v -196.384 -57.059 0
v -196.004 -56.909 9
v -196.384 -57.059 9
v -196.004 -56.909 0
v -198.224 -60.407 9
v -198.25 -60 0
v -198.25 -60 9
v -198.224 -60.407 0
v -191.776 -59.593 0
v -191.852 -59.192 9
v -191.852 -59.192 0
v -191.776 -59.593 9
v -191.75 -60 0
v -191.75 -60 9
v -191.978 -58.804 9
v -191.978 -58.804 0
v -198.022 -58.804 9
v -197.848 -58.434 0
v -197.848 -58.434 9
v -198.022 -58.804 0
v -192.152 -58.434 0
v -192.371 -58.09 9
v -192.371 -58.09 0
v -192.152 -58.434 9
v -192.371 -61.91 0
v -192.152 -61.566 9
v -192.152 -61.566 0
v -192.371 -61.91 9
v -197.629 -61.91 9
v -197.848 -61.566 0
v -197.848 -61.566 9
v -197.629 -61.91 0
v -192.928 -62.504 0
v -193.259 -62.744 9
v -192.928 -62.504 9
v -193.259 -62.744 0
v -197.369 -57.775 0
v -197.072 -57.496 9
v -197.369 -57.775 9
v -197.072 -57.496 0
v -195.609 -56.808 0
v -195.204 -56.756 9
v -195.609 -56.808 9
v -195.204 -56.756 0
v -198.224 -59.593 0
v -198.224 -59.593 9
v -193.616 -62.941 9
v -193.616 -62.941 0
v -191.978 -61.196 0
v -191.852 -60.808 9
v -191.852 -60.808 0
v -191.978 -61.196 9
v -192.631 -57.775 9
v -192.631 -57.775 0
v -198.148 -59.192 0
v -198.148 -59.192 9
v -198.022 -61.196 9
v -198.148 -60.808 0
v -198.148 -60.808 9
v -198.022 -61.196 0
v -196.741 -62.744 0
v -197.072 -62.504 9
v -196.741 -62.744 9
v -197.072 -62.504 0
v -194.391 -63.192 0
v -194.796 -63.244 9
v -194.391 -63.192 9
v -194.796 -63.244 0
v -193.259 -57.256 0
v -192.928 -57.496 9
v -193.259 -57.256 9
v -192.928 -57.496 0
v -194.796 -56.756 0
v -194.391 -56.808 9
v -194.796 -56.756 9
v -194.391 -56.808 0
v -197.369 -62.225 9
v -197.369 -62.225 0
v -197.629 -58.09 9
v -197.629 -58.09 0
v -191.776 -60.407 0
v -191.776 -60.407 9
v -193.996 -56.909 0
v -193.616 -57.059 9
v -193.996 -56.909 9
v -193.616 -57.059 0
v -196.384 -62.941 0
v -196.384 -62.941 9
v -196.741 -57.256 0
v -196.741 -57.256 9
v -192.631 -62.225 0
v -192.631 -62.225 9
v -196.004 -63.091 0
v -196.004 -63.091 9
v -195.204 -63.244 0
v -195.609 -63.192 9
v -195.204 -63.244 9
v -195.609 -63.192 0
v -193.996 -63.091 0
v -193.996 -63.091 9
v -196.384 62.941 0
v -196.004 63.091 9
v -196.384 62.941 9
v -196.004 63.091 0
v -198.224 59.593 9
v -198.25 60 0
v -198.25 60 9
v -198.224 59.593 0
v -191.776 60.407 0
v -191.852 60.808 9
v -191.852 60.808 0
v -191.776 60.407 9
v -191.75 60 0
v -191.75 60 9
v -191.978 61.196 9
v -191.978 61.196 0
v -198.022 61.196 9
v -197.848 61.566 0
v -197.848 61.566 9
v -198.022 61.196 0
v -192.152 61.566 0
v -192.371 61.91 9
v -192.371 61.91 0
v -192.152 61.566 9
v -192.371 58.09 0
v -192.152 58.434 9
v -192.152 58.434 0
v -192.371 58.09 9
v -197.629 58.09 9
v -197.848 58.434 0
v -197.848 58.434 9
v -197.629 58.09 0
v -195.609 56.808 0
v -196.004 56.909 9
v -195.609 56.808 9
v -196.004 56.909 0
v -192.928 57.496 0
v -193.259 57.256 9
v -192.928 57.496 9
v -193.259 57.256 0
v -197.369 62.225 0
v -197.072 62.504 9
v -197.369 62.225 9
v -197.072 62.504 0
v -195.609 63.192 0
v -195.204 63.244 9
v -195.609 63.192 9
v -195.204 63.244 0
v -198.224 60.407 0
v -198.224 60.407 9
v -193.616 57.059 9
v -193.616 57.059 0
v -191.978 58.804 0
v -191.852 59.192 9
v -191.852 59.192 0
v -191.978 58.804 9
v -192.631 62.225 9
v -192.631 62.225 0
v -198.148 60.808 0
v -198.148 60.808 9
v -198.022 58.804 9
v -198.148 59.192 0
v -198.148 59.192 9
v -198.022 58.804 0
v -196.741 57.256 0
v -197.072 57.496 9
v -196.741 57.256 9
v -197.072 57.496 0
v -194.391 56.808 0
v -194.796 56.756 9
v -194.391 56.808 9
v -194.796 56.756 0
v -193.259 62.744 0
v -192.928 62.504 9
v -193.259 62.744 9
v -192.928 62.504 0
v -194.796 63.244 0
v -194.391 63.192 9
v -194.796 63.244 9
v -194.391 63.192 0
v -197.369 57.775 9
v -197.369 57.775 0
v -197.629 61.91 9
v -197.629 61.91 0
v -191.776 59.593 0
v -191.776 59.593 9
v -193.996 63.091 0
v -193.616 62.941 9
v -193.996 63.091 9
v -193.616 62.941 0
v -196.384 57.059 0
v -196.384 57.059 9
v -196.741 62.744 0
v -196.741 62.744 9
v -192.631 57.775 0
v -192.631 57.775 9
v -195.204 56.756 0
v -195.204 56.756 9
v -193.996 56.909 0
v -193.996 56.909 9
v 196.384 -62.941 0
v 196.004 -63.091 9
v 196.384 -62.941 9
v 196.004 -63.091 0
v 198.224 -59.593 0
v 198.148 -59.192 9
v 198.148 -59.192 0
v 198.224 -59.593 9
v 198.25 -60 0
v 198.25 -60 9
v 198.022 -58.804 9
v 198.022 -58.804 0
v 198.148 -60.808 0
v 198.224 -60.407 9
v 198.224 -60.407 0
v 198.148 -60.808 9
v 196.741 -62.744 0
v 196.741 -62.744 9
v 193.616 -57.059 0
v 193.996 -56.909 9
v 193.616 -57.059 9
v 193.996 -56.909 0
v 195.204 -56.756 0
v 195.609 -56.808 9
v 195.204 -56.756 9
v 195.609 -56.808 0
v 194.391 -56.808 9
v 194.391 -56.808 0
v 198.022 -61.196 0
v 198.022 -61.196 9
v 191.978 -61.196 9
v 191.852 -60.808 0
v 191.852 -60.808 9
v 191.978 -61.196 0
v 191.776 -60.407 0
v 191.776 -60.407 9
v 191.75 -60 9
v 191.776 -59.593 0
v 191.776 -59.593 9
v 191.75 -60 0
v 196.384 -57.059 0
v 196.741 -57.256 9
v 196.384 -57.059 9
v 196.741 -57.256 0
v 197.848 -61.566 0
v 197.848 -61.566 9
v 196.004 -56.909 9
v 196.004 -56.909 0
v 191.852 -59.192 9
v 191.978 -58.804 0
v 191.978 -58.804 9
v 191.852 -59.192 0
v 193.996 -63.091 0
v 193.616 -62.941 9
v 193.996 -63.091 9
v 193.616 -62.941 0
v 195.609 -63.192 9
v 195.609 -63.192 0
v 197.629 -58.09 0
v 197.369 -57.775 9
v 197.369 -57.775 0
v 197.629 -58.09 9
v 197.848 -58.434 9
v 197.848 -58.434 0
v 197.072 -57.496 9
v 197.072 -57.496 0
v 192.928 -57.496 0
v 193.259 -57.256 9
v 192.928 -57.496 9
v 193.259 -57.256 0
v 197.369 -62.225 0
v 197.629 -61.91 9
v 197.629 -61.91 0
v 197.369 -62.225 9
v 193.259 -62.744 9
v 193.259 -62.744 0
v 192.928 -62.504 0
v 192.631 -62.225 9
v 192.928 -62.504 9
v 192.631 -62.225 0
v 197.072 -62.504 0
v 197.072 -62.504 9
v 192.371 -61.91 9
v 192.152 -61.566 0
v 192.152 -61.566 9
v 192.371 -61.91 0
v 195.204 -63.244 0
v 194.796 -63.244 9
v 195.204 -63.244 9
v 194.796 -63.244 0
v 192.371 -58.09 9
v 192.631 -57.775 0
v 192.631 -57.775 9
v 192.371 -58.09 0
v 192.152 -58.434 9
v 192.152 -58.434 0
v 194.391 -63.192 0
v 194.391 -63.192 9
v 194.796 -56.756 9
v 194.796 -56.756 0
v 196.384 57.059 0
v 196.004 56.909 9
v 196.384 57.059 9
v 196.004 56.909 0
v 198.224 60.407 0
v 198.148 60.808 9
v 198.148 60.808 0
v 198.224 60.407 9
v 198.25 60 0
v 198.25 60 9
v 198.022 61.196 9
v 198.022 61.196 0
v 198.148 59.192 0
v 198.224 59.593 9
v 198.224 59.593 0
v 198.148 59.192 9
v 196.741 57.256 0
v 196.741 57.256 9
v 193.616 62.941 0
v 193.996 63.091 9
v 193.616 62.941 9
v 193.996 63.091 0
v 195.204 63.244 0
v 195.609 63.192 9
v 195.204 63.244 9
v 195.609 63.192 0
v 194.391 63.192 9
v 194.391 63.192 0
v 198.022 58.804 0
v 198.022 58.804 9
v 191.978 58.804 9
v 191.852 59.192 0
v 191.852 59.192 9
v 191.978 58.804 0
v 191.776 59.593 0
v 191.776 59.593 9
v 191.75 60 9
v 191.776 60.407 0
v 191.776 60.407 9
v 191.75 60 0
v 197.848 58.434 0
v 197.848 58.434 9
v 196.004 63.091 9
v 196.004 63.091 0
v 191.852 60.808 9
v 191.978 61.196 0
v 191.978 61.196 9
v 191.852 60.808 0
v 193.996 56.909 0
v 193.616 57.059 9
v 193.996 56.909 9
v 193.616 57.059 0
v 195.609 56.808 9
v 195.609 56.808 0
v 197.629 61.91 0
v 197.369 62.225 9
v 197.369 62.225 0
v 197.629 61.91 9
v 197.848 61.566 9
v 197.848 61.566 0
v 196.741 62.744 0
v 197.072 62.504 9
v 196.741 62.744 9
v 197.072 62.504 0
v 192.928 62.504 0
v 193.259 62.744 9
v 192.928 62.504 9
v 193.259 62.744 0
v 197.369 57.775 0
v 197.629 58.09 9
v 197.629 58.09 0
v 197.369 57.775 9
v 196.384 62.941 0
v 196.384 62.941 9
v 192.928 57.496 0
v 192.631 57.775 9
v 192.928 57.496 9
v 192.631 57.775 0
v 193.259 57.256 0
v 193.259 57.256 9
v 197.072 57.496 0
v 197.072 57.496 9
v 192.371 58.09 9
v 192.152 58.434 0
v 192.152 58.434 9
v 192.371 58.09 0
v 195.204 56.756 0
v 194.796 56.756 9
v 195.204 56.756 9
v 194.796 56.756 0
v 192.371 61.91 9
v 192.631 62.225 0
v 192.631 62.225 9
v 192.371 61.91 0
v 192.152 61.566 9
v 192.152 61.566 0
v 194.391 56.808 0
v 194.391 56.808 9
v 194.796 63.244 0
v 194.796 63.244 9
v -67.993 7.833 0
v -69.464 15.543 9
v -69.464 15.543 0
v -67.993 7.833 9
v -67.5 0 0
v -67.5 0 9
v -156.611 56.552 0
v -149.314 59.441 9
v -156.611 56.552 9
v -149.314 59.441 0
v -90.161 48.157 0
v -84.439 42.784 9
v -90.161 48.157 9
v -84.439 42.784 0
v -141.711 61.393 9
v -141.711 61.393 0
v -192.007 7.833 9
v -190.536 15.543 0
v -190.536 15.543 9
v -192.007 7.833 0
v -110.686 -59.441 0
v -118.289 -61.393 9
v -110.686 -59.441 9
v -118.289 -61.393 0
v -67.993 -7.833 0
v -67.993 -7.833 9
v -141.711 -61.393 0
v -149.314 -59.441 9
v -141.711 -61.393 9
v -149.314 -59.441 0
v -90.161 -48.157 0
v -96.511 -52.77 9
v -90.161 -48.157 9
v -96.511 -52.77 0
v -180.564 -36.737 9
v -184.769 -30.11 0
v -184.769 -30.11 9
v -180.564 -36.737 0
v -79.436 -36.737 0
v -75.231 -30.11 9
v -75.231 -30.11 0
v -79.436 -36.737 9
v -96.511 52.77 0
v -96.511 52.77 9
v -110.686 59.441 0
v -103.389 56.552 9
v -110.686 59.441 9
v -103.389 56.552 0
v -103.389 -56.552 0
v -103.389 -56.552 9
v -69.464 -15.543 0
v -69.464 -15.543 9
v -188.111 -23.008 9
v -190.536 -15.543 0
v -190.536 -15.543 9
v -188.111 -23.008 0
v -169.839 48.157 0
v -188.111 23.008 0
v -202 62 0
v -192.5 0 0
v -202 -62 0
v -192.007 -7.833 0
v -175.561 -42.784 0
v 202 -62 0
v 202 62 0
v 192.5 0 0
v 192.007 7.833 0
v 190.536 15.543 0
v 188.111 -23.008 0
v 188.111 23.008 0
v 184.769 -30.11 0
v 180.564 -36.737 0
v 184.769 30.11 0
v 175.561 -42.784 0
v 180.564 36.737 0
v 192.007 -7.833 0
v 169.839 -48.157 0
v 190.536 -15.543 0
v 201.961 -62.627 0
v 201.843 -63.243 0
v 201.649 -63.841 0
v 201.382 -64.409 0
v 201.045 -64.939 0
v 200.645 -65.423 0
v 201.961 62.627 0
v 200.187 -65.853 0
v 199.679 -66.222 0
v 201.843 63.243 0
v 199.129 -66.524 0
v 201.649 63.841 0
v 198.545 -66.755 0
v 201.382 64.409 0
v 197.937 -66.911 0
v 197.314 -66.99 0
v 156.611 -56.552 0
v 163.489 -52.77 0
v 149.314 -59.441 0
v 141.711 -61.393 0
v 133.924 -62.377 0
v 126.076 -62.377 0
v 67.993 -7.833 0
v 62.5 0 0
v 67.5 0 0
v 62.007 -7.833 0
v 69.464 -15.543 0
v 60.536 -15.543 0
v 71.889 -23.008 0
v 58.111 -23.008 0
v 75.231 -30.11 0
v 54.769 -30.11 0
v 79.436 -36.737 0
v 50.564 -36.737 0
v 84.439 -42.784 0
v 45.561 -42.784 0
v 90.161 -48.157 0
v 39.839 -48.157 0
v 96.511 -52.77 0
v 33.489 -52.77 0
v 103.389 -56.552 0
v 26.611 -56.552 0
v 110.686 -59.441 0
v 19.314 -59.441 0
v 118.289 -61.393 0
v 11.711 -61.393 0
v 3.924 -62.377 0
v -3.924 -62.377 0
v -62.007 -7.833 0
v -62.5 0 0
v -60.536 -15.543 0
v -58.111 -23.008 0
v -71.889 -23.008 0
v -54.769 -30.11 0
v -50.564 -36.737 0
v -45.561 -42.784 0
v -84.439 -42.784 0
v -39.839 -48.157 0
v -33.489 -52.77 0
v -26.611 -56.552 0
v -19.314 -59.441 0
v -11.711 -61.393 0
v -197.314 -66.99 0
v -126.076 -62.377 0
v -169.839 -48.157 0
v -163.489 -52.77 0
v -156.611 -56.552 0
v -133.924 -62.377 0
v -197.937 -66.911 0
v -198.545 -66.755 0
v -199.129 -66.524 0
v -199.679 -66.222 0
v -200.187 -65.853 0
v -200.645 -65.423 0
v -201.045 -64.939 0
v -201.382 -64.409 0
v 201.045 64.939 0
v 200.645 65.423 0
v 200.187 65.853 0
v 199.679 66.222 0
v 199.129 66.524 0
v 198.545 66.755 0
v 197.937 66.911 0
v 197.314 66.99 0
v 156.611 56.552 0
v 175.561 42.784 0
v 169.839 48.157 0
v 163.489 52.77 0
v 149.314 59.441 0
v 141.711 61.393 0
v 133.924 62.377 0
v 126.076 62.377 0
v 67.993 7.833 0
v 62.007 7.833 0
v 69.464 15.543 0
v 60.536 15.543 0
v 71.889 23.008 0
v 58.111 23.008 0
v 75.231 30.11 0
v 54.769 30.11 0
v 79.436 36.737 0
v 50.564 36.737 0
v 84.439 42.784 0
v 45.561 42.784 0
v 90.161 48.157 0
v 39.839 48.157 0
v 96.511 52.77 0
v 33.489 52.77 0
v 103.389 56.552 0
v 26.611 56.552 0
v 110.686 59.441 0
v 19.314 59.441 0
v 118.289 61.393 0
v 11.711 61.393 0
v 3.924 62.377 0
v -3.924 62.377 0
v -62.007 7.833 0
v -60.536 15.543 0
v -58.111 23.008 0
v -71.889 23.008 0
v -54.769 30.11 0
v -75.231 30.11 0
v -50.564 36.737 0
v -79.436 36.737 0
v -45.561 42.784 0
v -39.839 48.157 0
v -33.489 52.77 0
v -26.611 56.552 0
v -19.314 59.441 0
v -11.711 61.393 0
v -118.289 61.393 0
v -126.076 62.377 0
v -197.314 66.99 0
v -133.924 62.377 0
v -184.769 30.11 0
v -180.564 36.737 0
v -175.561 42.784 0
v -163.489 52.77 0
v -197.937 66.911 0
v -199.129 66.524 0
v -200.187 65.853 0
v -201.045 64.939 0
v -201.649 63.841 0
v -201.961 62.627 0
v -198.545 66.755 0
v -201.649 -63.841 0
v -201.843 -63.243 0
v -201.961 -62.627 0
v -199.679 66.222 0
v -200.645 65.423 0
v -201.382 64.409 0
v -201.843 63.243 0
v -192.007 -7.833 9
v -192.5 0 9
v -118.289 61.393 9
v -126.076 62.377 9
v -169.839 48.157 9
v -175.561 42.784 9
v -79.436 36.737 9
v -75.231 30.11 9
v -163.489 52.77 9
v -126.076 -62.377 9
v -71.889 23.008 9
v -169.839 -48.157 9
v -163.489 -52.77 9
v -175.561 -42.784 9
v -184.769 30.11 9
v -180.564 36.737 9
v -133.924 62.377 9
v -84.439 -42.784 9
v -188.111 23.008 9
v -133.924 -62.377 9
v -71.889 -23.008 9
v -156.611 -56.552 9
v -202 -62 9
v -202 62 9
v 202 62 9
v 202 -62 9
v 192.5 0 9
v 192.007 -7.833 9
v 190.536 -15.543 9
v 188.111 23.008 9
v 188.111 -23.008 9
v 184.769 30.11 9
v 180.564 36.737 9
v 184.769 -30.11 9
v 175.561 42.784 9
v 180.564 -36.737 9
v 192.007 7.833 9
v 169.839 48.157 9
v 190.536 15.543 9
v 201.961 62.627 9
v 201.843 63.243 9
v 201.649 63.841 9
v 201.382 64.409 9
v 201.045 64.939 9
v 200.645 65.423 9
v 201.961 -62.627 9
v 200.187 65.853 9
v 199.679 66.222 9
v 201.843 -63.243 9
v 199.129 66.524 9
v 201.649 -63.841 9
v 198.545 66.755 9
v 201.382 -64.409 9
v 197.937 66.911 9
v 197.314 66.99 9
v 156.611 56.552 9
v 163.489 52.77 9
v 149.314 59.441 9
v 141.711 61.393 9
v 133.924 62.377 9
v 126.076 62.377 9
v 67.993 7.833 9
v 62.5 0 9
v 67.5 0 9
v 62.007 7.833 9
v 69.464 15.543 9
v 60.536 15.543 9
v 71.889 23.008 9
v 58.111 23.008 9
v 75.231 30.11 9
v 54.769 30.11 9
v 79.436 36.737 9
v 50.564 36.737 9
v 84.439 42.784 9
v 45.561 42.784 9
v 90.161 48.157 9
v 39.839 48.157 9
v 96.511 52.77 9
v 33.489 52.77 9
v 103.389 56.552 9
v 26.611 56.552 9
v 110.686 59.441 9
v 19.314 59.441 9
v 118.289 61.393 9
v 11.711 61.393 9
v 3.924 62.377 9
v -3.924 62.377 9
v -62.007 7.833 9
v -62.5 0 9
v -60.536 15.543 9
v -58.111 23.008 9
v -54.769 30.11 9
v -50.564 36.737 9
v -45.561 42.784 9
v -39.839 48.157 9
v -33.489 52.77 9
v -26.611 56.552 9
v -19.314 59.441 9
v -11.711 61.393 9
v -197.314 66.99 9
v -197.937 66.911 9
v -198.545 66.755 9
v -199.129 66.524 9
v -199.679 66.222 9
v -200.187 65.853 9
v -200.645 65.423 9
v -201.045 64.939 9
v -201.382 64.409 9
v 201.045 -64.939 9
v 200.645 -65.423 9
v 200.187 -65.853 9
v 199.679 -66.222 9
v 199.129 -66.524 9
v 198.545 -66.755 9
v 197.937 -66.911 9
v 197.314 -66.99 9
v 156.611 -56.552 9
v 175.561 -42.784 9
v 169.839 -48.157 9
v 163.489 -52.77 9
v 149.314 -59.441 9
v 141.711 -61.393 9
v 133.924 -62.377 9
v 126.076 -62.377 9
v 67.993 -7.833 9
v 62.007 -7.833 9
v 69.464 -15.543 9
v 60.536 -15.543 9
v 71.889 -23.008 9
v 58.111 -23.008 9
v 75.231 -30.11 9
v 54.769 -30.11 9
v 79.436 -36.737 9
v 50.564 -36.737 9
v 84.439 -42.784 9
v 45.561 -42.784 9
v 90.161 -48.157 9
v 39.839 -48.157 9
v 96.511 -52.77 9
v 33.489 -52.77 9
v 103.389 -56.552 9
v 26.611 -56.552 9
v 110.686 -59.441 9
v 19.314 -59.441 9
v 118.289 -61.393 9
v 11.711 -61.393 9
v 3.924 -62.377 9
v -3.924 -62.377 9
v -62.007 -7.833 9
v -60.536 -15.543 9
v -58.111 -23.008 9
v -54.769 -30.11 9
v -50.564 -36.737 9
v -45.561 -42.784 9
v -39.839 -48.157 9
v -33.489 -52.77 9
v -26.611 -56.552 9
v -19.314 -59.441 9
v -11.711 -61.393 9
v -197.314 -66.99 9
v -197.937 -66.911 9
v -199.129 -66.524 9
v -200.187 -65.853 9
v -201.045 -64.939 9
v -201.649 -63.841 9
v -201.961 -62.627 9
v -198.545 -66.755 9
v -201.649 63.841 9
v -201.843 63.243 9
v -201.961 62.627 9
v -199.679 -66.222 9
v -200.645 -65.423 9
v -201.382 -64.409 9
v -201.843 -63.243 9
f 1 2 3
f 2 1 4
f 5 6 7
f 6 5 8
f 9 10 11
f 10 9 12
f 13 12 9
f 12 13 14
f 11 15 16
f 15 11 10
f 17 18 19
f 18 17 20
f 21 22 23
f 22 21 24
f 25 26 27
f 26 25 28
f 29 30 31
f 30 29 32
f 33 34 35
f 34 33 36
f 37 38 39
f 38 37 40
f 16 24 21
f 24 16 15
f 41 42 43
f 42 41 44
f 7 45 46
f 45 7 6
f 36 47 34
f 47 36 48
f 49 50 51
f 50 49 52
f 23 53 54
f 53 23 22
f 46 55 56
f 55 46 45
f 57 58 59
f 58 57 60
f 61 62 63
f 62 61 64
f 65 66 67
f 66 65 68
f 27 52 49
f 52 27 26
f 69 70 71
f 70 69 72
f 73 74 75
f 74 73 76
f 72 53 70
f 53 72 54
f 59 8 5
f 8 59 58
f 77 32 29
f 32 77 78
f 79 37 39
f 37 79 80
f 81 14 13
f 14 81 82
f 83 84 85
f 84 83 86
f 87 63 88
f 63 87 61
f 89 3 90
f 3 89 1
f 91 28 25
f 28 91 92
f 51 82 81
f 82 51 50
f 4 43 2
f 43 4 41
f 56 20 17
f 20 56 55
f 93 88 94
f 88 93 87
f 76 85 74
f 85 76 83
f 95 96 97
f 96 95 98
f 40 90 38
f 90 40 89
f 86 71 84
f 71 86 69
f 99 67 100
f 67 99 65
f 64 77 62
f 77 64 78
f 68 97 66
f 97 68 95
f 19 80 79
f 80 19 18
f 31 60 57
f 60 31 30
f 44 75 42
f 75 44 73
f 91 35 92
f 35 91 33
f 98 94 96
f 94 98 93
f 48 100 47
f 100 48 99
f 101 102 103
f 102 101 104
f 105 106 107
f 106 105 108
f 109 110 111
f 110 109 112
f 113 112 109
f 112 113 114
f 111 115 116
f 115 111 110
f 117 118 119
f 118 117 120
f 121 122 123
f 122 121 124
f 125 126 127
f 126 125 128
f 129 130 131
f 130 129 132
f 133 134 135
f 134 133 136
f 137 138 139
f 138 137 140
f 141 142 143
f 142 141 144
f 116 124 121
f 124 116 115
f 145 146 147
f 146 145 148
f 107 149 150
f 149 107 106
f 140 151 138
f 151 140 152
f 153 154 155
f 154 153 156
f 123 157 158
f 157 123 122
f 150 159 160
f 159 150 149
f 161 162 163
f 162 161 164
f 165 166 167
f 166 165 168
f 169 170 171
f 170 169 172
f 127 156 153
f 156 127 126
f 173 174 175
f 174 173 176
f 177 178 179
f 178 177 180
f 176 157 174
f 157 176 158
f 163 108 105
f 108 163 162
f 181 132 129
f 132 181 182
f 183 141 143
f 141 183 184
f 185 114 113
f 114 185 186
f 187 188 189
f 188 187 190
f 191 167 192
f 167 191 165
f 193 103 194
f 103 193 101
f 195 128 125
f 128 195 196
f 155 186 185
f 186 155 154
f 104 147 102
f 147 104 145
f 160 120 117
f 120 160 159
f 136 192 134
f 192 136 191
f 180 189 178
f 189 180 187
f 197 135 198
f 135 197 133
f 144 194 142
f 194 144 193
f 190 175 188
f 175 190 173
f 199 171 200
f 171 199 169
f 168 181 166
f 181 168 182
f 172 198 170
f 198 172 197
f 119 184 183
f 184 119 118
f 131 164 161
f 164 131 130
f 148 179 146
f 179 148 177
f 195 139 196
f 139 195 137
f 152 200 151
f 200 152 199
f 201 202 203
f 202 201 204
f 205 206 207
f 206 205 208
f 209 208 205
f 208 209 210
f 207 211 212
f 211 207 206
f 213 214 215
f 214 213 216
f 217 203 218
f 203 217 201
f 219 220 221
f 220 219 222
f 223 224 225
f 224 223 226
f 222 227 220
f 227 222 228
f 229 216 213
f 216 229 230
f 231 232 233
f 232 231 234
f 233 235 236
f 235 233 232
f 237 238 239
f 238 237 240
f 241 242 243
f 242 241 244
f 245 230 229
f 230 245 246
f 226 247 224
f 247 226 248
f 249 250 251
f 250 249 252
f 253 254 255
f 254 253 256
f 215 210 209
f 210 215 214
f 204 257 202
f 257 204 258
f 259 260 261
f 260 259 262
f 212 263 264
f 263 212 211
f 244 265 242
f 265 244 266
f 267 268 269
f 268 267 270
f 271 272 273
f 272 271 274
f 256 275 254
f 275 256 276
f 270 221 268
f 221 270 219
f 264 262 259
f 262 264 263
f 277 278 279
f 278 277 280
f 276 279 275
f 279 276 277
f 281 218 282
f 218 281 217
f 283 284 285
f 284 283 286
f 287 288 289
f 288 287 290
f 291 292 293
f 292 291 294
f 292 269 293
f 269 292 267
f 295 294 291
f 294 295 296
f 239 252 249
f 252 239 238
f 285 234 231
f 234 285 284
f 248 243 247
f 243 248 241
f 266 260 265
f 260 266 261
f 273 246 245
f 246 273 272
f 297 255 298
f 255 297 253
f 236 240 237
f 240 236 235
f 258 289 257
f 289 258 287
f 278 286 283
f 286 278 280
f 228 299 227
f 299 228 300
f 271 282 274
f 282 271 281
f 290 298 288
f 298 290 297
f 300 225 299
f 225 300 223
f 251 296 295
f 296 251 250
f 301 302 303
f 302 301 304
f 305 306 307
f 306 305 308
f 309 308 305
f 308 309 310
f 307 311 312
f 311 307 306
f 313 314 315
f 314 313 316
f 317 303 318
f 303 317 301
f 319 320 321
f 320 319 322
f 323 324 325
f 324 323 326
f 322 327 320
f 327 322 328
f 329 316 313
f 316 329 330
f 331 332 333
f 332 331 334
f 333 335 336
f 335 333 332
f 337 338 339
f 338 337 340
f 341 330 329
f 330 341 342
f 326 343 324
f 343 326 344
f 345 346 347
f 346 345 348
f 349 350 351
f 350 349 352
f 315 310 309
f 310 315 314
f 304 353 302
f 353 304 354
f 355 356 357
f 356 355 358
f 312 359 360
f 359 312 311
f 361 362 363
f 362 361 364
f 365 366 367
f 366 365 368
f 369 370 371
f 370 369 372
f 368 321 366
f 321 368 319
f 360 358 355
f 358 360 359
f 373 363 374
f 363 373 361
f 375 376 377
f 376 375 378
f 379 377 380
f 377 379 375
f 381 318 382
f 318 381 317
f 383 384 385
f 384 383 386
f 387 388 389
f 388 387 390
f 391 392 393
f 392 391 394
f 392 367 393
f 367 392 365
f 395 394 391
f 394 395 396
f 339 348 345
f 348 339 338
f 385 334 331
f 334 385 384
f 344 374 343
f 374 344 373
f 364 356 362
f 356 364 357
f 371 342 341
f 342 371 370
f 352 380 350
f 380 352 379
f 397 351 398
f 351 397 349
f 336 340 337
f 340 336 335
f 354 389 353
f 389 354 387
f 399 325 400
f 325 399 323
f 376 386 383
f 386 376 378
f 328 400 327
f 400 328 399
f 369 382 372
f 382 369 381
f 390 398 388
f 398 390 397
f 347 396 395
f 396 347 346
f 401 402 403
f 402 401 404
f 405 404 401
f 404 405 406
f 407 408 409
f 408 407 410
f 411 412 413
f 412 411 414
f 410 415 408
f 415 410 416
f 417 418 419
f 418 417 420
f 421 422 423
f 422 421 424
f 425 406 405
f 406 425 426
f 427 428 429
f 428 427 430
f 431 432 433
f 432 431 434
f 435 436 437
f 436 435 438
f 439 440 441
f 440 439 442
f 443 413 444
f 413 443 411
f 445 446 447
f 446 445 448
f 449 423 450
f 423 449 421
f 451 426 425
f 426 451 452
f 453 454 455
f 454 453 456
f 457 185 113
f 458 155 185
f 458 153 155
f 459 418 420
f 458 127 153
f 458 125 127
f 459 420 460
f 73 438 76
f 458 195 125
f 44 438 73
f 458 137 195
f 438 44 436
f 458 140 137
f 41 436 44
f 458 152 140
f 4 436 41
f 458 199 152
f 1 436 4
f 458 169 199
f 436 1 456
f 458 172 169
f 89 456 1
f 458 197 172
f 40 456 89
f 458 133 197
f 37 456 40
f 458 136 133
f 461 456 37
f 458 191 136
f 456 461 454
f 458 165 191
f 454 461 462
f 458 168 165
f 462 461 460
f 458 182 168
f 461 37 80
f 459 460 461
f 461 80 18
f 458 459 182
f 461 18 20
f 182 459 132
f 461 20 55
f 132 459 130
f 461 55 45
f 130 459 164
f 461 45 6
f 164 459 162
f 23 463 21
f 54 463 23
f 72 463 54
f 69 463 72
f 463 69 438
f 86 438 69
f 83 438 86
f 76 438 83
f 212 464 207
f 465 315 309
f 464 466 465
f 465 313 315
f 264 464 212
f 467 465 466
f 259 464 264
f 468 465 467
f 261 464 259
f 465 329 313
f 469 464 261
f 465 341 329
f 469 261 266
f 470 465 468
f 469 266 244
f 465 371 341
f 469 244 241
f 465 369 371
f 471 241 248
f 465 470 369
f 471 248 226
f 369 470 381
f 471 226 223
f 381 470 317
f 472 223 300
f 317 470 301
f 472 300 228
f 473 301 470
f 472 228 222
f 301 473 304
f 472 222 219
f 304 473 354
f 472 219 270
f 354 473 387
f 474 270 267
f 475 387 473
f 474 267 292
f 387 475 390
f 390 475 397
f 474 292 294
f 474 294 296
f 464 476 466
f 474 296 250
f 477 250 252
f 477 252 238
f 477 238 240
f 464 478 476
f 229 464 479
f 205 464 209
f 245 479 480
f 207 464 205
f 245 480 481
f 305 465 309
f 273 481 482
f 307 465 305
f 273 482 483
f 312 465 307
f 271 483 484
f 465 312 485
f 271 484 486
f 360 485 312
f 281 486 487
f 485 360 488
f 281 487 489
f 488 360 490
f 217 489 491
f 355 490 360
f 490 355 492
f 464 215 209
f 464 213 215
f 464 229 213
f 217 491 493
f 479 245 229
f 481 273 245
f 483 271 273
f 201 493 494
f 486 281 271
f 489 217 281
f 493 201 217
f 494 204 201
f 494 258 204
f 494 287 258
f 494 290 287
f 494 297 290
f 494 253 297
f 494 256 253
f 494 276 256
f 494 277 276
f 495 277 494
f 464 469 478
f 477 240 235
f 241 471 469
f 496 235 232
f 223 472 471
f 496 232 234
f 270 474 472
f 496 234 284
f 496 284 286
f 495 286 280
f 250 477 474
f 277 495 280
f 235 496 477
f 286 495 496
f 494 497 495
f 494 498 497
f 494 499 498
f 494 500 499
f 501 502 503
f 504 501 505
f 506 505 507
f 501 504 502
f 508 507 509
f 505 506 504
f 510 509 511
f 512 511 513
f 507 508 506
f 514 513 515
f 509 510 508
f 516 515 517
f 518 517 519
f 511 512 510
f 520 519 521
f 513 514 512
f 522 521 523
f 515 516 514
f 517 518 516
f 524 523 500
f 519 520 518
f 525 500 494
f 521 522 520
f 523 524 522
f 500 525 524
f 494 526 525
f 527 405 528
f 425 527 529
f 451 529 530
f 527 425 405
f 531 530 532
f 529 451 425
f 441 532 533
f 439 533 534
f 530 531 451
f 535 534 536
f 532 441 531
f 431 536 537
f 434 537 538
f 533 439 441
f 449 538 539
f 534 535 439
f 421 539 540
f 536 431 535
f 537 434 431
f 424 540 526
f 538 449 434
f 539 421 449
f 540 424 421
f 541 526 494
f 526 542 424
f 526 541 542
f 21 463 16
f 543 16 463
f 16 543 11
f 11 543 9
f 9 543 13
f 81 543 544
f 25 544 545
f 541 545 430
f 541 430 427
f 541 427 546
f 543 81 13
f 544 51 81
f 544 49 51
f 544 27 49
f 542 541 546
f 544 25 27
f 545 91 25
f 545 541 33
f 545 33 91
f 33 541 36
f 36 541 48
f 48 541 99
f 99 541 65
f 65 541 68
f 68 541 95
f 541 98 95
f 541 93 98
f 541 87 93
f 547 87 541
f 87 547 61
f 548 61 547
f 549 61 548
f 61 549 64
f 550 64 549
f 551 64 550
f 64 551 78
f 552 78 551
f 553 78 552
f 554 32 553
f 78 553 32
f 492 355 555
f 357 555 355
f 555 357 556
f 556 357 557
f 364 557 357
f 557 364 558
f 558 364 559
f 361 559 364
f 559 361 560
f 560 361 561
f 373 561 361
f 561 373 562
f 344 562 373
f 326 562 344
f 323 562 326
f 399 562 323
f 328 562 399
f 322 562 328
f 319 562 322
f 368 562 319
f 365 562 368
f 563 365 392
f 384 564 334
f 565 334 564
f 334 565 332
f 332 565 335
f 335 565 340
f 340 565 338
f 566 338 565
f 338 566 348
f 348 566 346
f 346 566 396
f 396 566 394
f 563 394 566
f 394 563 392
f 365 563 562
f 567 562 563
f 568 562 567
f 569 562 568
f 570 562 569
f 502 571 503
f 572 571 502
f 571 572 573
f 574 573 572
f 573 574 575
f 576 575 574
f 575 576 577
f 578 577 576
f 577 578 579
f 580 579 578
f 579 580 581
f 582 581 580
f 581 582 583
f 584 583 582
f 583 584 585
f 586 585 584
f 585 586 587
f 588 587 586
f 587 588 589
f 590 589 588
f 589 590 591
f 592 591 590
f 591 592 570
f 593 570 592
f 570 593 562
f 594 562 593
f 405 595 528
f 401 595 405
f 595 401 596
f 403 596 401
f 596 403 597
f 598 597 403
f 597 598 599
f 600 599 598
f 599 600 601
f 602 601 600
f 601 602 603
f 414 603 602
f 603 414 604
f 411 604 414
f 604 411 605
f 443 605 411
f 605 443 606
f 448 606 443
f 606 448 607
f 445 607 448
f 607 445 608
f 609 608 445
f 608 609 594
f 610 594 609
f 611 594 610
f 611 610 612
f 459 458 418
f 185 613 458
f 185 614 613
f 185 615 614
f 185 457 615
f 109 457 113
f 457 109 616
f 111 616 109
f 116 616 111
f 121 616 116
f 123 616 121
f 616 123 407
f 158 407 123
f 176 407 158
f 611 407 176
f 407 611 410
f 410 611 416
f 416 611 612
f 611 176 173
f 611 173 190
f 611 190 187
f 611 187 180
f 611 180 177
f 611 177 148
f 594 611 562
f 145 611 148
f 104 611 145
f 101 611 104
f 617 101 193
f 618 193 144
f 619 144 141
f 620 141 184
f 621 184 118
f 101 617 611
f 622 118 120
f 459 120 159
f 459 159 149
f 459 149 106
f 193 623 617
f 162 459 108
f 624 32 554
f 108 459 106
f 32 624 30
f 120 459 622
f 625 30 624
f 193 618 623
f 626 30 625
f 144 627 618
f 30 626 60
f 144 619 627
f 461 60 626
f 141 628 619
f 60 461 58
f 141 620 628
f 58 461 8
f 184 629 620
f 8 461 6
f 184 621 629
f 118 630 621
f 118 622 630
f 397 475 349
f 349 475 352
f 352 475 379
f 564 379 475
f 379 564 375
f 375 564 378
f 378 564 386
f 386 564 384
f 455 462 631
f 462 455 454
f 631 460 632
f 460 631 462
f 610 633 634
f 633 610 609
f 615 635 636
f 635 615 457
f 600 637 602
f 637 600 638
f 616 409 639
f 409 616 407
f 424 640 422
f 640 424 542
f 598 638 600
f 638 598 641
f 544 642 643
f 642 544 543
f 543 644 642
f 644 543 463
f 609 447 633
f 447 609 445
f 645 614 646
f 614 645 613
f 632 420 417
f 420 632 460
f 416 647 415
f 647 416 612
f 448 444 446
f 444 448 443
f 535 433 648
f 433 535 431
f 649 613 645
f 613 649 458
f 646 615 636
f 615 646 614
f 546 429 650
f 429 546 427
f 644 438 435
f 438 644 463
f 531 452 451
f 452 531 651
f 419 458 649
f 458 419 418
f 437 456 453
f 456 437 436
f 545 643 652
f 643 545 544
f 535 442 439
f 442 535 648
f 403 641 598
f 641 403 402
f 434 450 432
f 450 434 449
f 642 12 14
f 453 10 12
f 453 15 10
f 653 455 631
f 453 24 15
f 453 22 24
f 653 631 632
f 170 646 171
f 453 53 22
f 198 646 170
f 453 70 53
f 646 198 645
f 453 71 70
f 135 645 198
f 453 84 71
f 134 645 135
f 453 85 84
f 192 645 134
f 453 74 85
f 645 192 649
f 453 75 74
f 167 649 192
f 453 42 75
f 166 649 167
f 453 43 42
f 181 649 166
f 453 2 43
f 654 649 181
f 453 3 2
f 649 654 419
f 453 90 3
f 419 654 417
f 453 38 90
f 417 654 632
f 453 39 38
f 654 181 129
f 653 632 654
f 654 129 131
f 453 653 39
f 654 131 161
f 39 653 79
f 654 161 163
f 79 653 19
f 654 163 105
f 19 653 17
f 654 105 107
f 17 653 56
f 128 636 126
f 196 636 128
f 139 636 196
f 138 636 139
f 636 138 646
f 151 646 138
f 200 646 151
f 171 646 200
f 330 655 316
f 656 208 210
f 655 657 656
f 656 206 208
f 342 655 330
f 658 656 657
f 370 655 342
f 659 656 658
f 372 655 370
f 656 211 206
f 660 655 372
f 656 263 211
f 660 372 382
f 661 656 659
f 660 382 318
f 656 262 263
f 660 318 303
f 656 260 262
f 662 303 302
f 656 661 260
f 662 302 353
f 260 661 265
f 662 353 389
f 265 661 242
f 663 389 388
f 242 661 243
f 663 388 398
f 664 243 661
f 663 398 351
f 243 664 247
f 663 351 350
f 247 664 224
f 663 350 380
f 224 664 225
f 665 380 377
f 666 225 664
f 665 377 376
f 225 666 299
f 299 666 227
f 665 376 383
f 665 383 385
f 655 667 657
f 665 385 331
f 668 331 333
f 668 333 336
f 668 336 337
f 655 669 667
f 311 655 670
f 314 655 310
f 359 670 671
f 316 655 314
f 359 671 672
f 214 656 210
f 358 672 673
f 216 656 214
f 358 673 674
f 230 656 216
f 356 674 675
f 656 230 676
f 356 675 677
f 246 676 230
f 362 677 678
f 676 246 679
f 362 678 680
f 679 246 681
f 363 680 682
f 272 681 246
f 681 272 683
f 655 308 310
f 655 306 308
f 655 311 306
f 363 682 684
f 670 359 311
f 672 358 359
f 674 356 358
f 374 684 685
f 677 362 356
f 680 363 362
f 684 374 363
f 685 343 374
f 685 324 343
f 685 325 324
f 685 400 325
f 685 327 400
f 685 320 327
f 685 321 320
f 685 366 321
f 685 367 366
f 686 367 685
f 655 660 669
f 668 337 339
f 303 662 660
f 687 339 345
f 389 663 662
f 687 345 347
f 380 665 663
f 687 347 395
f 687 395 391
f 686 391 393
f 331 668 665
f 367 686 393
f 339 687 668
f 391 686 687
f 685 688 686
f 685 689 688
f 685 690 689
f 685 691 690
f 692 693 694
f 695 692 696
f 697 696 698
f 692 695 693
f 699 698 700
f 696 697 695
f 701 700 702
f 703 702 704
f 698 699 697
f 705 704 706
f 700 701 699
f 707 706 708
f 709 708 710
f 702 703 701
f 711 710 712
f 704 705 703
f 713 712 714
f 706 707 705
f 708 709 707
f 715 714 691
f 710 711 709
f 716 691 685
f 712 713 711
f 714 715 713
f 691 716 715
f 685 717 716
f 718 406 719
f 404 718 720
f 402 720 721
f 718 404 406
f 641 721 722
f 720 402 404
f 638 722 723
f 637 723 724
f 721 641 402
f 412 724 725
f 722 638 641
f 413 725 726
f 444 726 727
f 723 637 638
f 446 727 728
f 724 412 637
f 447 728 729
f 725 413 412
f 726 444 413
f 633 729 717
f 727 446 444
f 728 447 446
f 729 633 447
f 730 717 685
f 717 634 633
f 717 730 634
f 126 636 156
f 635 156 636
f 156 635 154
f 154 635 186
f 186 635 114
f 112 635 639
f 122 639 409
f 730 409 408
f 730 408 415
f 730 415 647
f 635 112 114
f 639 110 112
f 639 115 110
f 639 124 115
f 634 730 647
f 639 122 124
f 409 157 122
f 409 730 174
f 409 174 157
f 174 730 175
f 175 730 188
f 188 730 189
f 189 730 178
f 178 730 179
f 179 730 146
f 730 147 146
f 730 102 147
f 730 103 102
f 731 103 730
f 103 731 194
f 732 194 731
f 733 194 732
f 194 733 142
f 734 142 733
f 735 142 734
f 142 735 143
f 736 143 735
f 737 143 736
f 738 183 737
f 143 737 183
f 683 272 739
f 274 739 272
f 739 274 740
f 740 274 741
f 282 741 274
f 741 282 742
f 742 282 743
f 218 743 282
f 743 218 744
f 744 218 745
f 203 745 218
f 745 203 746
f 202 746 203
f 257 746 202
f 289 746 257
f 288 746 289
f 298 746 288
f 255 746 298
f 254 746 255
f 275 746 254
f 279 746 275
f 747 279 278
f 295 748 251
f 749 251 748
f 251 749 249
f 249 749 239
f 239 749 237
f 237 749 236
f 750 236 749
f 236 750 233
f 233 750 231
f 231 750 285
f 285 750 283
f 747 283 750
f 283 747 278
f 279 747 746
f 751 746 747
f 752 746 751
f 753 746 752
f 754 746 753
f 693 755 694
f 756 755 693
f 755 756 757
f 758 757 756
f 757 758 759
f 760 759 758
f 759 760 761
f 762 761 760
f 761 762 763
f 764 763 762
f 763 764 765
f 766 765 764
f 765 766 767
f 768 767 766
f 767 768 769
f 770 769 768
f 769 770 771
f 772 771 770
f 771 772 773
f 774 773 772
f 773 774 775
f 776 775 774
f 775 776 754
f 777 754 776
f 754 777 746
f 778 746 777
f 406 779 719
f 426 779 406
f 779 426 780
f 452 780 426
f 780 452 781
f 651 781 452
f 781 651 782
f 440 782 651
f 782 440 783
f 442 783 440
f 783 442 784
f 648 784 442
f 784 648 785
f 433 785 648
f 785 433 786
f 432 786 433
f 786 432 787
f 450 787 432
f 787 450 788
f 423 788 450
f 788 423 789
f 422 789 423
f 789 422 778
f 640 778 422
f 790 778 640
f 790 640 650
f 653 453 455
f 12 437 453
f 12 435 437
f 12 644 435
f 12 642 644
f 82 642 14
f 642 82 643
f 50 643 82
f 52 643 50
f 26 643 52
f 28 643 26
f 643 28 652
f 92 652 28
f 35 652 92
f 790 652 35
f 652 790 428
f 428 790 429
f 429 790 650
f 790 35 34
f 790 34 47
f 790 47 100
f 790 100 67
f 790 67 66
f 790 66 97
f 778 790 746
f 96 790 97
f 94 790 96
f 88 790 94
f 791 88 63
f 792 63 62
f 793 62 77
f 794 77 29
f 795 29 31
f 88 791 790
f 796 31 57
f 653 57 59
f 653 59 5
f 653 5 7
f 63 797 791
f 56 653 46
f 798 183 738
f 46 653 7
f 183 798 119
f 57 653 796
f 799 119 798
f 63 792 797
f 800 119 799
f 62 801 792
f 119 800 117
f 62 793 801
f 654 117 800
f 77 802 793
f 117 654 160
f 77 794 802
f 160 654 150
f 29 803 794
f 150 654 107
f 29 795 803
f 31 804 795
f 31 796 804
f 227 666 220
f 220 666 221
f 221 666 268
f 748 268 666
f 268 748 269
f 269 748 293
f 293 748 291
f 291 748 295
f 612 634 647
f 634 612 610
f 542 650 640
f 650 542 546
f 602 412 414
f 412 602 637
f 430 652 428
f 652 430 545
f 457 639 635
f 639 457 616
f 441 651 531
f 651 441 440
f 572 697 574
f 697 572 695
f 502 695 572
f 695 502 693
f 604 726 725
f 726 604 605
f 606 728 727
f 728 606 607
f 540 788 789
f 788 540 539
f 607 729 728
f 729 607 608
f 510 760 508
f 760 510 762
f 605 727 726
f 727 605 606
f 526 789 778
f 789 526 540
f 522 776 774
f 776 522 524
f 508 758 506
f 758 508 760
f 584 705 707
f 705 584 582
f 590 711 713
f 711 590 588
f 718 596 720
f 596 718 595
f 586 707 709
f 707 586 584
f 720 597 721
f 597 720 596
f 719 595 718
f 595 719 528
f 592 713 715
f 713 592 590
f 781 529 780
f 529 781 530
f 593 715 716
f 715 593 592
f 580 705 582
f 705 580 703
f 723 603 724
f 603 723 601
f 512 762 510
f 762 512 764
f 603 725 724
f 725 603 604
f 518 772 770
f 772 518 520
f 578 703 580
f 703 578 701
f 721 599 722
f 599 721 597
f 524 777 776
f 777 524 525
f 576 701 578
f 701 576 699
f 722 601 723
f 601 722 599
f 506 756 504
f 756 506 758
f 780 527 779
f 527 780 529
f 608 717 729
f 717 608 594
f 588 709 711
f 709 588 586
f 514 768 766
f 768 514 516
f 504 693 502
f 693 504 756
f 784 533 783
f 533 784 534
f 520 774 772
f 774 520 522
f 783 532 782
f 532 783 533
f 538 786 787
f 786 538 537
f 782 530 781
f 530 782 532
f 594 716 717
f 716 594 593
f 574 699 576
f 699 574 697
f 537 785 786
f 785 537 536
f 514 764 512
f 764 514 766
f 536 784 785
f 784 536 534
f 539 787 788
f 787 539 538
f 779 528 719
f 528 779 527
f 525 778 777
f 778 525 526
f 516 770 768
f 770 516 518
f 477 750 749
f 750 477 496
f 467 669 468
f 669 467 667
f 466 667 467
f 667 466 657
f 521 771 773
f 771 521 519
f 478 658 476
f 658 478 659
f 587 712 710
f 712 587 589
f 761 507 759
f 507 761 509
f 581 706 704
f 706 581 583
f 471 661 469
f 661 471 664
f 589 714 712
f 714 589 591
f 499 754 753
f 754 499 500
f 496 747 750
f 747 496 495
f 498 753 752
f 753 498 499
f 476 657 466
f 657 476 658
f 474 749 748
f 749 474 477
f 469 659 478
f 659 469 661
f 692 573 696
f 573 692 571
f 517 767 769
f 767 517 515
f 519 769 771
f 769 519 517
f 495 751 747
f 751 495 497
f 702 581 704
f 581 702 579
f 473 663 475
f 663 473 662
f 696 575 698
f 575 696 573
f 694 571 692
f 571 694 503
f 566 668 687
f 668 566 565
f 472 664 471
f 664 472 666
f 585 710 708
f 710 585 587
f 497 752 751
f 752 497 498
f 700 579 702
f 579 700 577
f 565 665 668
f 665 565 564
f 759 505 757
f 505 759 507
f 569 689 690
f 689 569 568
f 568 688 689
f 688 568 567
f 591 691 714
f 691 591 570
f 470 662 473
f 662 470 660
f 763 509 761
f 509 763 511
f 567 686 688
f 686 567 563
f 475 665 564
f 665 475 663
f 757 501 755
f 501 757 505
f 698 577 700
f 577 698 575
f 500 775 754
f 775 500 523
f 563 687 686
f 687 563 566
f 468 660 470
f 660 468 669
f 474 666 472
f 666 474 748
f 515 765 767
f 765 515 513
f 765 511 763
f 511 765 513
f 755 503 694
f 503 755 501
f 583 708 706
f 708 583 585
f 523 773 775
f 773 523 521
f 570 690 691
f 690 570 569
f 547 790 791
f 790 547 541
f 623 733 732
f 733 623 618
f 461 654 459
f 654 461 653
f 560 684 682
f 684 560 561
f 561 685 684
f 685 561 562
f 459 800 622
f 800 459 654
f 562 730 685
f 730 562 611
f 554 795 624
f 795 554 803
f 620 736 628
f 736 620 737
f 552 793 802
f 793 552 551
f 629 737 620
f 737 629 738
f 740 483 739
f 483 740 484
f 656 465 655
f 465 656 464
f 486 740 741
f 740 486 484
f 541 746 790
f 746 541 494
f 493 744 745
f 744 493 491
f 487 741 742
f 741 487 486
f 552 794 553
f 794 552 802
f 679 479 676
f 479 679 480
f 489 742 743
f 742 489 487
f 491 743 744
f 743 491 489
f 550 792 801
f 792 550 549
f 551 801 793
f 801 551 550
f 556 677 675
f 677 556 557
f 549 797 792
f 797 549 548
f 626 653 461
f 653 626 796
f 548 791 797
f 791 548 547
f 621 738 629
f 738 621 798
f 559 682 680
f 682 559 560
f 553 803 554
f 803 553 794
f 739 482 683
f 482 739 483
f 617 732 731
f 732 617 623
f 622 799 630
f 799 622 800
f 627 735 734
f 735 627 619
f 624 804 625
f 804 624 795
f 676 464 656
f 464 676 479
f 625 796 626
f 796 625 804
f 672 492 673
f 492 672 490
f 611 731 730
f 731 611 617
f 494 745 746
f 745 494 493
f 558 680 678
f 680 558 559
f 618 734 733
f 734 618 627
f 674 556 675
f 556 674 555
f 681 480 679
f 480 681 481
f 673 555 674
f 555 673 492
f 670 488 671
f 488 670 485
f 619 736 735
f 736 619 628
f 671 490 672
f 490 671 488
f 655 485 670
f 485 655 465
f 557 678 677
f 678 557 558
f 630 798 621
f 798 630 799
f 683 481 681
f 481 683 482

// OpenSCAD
$fn = 50;

difference() {
	union() {
		hull() {
			translate(v = [-197.0, 62.0, 0]) {
				cylinder(h = 9, r = 5);
			}
			translate(v = [197.0, 62.0, 0]) {
				cylinder(h = 9, r = 5);
			}
			translate(v = [-197.0, -62.0, 0]) {
				cylinder(h = 9, r = 5);
			}
			translate(v = [197.0, -62.0, 0]) {
				cylinder(h = 9, r = 5);
			}
		}
	}
	union() {
		translate(v = [-195.0, -60.0, -100.0]) {
			cylinder(h = 200, r = 3.25);
		}
		translate(v = [-195.0, 60.0, -100.0]) {
			cylinder(h = 200, r = 3.25);
		}
		translate(v = [195.0, -60.0, -100.0]) {
			cylinder(h = 200, r = 3.25);
		}
		translate(v = [195.0, 60.0, -100.0]) {
			cylinder(h = 200, r = 3.25);
		}
		translate(v = [-195.0, -60.0, -100.0]) {
			cylinder(h = 200, r = 1.8);
		}
		translate(v = [-195.0, 60.0, -100.0]) {
			cylinder(h = 200, r = 1.8);
		}
		translate(v = [195.0, -60.0, -100.0]) {
			cylinder(h = 200, r = 1.8);
		}
		translate(v = [195.0, 60.0, -100.0]) {
			cylinder(h = 200, r = 1.8);
		}
		translate(v = [-130.0, 0, 0.0]) {
			cylinder(h = 9, r = 62.5);
		}
		cylinder(h = 9, r = 62.5);
		translate(v = [130.0, 0, 0.0]) {
			cylinder(h = 9, r = 62.5);
		}
	}
}
